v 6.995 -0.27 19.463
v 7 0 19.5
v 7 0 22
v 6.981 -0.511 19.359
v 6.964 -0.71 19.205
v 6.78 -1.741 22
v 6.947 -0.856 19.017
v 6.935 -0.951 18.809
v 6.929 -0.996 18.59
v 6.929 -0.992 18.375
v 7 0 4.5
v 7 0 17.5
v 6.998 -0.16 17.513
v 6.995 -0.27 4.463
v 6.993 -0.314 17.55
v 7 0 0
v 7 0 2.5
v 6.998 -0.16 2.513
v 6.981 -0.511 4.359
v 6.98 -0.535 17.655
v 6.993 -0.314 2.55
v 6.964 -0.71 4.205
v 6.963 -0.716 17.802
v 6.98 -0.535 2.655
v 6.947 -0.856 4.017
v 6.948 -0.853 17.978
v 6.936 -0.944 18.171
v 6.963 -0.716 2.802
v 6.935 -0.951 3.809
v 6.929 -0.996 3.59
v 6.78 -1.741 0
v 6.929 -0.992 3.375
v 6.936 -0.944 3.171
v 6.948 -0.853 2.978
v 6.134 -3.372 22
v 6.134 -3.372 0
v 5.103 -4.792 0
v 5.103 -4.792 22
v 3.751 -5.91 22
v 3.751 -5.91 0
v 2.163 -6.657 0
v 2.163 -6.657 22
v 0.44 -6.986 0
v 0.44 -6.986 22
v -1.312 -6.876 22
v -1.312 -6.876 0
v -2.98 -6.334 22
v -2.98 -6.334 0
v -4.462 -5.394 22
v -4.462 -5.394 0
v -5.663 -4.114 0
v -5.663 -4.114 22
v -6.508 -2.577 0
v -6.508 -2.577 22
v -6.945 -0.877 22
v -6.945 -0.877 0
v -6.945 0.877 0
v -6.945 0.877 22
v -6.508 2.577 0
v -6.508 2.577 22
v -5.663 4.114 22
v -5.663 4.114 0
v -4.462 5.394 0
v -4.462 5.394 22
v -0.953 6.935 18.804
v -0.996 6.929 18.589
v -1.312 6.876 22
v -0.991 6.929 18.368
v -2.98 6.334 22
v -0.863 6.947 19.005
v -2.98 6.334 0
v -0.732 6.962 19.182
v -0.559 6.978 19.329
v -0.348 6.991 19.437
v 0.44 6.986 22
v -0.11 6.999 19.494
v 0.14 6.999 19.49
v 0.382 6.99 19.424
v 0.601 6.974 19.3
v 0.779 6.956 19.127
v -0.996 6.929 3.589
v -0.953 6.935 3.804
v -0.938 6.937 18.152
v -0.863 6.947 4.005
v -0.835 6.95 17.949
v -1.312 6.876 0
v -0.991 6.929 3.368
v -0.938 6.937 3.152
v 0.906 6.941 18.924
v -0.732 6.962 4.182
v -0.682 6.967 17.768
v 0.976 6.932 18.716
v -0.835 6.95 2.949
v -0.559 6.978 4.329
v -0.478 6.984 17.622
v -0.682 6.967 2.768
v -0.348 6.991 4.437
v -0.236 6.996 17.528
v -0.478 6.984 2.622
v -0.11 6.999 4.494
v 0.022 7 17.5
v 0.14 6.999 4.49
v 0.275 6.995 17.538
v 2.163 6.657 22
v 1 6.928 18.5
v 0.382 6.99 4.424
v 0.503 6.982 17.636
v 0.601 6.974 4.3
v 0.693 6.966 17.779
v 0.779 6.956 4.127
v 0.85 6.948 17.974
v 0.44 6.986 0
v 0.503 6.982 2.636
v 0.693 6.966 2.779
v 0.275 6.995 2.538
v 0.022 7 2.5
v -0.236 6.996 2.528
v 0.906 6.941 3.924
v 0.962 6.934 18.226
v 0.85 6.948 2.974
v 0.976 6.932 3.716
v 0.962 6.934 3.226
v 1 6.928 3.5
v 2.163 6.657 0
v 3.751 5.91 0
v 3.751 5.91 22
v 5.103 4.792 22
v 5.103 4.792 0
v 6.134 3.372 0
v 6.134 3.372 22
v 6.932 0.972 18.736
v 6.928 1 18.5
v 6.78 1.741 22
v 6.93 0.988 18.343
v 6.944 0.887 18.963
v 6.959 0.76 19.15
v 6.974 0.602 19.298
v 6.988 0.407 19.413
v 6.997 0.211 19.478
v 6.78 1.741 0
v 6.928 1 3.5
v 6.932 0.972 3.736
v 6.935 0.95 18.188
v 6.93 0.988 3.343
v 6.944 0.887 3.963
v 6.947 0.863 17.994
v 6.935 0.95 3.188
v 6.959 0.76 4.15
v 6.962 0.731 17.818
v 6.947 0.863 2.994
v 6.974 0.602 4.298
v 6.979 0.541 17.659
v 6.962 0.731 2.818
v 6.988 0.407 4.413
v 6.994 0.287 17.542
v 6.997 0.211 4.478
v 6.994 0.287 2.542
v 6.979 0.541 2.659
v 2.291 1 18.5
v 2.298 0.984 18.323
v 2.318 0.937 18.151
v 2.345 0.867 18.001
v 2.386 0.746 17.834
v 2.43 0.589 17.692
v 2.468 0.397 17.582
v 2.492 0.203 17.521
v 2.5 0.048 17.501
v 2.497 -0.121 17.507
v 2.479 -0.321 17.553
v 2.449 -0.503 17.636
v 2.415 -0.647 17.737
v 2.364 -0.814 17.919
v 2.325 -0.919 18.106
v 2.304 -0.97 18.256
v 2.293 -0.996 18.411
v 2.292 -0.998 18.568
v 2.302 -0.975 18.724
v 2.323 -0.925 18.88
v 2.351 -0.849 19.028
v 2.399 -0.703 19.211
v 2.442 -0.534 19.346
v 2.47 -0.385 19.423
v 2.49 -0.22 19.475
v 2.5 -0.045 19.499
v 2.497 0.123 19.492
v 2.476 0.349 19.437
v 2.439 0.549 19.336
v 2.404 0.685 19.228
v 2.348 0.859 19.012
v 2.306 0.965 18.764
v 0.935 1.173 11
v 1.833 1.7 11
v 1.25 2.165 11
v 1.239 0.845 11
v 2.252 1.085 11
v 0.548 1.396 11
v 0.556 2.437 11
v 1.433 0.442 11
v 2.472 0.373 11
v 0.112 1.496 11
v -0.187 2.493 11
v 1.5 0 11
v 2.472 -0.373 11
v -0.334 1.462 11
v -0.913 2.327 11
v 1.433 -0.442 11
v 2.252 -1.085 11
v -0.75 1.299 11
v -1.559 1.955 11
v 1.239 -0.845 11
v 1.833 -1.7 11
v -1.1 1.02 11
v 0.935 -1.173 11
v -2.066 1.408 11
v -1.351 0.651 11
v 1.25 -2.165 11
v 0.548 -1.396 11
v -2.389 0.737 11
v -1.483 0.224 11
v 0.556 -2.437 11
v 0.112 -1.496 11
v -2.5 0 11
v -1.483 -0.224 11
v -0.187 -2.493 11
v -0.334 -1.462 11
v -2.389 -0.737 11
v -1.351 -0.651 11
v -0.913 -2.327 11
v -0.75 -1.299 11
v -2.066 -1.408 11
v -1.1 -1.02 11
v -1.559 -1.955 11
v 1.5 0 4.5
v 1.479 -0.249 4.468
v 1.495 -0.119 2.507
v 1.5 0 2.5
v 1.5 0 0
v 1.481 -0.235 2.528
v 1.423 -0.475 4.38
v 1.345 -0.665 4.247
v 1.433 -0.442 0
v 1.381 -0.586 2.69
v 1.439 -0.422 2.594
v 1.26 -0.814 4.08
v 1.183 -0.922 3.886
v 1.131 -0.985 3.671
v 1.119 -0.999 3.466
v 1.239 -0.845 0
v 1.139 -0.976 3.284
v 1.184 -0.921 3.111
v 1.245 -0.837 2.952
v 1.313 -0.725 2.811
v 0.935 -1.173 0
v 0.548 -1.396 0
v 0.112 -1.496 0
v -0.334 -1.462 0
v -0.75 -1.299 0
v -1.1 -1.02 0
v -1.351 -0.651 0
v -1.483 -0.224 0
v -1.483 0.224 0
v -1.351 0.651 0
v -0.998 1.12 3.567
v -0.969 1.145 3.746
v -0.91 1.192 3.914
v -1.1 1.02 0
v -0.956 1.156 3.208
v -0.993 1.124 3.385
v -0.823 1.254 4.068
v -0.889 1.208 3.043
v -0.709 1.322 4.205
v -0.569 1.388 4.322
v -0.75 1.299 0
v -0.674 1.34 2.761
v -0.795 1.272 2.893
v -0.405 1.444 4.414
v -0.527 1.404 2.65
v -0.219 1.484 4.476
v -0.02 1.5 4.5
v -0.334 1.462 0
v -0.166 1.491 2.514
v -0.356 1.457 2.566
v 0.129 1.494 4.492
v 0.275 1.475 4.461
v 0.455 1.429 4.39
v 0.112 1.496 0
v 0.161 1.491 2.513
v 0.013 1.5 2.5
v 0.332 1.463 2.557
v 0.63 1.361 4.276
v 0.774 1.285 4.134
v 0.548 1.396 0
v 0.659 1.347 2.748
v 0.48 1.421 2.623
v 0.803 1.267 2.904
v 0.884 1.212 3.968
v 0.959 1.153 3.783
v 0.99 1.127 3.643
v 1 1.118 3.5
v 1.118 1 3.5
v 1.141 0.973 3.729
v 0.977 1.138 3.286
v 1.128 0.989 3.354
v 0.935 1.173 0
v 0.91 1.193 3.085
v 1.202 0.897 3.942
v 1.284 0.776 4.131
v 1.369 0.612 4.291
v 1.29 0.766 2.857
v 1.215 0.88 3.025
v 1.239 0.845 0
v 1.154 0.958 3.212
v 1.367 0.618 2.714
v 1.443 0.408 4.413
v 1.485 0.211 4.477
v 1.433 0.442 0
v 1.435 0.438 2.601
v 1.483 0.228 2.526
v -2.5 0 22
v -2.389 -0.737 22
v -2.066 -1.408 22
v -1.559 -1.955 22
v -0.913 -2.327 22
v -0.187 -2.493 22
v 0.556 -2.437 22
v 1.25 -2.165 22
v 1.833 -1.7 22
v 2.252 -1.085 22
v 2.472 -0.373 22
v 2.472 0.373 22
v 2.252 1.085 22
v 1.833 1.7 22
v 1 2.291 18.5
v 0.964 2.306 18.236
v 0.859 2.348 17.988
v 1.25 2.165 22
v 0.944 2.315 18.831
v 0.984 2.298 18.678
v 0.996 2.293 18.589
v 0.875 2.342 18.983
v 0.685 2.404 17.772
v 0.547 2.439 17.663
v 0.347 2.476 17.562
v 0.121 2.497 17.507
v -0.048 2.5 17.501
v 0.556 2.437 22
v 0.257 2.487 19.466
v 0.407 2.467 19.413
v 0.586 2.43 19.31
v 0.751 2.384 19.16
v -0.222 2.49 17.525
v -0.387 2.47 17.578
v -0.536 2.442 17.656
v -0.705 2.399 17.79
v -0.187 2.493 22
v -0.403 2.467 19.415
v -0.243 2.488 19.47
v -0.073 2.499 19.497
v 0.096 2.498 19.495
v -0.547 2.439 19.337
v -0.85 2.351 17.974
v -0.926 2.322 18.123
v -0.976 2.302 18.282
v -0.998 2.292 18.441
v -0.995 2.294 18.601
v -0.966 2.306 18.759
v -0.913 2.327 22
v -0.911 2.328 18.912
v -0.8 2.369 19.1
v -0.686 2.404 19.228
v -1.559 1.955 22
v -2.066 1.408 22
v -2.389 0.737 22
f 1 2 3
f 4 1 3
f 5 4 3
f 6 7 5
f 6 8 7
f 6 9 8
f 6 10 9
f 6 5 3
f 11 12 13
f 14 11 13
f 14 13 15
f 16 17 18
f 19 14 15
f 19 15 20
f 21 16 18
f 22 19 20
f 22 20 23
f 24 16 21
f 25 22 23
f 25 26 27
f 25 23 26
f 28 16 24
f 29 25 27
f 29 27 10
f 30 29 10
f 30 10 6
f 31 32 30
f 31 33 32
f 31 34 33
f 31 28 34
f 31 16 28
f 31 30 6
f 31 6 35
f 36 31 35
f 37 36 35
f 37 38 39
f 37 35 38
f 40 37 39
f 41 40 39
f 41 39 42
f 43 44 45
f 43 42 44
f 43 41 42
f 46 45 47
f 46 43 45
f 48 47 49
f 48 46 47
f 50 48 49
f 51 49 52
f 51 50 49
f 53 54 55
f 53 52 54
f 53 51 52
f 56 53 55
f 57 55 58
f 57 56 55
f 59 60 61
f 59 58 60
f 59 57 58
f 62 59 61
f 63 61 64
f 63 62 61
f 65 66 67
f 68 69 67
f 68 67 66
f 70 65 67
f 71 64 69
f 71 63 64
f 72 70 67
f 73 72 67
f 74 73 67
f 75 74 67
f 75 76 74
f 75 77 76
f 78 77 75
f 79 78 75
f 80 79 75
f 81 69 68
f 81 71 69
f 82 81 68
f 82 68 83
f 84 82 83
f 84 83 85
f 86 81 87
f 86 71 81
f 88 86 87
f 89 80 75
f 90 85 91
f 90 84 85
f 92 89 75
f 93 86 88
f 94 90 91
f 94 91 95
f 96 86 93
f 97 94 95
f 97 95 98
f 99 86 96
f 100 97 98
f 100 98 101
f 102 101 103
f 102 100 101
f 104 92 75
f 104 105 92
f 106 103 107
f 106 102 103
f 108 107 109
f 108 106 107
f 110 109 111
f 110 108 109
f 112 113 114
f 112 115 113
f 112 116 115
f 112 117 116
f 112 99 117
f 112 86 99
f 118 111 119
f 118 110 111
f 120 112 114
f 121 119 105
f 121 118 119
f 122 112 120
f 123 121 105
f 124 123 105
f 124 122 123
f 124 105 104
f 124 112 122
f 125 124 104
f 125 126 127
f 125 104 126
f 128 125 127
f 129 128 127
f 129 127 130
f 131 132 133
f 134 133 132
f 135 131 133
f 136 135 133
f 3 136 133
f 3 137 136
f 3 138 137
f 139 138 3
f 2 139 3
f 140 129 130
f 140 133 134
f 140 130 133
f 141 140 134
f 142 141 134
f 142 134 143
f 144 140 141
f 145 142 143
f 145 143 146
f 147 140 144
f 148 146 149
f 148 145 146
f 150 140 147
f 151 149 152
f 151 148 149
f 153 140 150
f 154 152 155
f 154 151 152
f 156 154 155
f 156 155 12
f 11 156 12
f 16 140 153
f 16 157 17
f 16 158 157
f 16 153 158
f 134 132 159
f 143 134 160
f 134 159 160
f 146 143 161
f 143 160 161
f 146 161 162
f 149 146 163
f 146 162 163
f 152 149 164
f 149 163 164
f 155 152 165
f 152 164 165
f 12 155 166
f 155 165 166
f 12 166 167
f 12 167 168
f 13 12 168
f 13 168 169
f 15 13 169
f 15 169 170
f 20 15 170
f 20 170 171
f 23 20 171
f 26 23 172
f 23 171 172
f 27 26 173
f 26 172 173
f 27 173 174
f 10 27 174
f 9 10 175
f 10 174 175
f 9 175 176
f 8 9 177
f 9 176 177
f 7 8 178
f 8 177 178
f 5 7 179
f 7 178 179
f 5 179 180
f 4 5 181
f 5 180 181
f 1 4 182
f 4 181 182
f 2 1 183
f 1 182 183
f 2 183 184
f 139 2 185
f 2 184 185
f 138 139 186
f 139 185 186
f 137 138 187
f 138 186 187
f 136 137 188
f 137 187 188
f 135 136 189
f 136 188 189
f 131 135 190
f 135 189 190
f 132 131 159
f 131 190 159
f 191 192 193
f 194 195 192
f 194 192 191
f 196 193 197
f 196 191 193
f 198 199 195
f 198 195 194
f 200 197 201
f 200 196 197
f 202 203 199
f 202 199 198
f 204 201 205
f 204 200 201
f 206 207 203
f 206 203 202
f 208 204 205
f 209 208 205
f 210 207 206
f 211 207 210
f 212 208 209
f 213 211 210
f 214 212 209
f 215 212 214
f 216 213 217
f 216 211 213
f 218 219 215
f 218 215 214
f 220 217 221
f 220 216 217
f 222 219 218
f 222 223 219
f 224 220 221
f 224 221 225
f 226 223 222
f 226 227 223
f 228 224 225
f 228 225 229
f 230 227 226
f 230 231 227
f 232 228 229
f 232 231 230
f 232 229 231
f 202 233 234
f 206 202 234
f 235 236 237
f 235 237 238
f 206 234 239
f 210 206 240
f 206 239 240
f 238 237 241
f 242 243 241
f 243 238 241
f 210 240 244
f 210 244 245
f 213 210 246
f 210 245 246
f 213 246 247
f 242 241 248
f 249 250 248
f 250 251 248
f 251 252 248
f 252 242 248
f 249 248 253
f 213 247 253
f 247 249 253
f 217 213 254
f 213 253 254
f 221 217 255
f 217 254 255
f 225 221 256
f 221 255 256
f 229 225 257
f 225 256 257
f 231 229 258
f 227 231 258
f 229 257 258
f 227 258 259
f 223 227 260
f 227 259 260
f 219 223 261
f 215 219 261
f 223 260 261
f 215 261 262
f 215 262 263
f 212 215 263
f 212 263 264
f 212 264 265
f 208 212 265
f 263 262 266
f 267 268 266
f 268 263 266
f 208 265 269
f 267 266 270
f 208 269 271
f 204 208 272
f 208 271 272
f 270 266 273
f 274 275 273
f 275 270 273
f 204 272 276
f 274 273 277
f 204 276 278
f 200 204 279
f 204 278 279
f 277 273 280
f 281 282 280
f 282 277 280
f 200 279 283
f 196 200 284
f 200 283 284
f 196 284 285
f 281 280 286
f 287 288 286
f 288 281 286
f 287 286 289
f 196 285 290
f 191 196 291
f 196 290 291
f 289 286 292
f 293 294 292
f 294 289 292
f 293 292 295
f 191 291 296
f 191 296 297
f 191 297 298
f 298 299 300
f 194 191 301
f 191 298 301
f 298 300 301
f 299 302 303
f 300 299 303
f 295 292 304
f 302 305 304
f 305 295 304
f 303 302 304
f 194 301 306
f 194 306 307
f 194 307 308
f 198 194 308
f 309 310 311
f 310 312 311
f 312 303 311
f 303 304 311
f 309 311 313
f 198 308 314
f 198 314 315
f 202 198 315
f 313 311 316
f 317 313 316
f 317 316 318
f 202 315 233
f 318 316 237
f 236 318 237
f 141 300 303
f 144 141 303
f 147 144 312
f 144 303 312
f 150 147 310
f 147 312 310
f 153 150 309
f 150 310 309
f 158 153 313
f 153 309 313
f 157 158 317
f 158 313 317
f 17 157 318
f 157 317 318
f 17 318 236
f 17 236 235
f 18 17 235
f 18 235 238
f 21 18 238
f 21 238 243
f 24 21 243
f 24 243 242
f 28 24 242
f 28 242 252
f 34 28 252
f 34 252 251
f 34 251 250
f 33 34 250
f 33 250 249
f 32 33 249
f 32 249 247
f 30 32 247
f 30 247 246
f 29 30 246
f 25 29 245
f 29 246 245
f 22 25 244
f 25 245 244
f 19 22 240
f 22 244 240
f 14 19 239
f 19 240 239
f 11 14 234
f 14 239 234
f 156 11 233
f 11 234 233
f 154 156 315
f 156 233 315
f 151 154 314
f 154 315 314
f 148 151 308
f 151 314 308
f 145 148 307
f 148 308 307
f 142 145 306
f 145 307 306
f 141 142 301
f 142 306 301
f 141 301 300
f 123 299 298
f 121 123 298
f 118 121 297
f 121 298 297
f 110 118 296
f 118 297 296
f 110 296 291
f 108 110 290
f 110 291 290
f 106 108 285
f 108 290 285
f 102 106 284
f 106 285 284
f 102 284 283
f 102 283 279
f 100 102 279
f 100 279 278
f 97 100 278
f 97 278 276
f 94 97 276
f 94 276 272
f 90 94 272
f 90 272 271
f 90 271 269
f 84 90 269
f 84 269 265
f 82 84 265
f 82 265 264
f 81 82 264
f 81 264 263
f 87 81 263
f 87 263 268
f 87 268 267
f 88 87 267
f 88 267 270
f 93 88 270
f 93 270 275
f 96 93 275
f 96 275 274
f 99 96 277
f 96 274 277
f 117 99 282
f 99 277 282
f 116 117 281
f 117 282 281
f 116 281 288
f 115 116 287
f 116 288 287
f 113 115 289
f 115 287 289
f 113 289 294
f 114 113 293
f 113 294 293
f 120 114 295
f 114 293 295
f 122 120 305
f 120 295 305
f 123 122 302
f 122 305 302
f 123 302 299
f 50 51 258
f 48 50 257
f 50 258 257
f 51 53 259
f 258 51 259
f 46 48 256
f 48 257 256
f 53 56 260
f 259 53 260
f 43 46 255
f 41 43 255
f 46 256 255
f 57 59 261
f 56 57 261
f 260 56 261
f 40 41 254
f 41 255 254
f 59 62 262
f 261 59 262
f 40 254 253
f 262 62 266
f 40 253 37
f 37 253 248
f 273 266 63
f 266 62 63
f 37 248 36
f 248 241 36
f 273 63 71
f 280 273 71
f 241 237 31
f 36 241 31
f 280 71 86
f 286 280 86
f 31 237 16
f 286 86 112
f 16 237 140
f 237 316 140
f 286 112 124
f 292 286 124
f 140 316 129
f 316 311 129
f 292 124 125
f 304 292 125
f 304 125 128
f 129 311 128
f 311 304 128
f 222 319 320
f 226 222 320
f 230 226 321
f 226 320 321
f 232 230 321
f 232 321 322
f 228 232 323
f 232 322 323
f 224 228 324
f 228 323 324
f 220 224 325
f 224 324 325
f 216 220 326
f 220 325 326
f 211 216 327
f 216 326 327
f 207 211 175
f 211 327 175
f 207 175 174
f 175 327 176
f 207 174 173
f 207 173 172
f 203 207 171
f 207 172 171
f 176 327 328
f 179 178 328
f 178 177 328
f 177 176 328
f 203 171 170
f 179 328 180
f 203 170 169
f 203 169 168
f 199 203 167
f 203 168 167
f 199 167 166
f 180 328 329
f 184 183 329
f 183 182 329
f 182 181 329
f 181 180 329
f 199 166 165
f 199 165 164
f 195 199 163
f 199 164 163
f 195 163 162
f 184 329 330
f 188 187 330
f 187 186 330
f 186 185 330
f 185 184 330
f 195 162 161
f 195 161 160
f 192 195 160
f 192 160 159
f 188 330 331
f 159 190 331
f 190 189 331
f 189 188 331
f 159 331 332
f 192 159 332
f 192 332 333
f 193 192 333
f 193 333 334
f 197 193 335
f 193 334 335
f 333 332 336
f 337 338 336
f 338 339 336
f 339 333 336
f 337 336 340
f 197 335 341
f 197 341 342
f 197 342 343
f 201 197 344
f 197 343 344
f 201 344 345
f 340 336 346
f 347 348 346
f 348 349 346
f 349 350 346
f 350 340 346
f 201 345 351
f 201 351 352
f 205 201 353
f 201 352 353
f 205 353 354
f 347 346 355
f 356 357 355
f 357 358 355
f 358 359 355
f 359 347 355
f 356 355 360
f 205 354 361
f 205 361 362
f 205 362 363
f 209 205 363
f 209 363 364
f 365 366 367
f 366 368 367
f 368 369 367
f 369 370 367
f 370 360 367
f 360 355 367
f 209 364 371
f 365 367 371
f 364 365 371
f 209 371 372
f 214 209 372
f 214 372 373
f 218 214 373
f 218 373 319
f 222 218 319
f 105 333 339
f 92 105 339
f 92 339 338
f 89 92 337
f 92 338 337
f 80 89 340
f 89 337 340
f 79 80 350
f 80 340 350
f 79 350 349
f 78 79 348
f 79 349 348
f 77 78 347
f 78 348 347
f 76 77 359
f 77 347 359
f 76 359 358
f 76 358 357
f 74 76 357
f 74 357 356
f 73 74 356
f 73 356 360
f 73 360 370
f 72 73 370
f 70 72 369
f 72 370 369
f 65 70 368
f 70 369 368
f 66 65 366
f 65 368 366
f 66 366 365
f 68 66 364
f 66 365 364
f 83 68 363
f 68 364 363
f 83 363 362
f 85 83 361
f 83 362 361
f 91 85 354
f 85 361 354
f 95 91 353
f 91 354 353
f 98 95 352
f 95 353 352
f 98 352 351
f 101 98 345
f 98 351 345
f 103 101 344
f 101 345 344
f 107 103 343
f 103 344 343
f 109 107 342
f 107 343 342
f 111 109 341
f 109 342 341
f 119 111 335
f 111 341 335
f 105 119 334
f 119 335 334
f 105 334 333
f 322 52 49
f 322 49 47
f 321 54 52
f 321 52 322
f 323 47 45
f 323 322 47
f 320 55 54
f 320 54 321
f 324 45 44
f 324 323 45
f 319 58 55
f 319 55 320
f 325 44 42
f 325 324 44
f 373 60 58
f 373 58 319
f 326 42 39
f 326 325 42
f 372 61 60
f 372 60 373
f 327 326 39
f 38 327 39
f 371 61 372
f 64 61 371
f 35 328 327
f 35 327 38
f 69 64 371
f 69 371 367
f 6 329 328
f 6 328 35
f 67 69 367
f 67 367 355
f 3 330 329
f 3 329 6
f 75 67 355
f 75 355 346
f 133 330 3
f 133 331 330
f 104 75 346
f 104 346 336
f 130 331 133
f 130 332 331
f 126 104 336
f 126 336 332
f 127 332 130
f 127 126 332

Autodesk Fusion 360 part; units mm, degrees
sketch "スケッチ1" plane through (0, 0, 0) normal (0, 0, 1) x (1, 0, 0)
  circle A0 centre (0, 0) radius 7
  dimension "d1" = 14
extrude "押し出し1" add sketch "スケッチ1" along normal blind 12
extrude "押し出し2" add 1 faces at (1.11, -1.8763, 12) along direction (0, 0, 1) blind 10
sketch "スケッチ2" plane through (0, 0, 22) normal (0, 0, 1) x (-1, 0, 0)
  circle A0 centre (0, 0) radius 7
  circle A1 centre (0, 0) radius 2.5
  dimension "d6" = 5
sketch "スケッチ3" plane through (0, 0, 0) normal (0, 0, -1) x (1, 0, 0)
  circle A0 centre (0, 0) radius 7
  circle A1 centre (0, 0) radius 1.5
  dimension "d7" = 3
extrude "押し出し3" cut sketch "スケッチ3" against normal blind 11 contours A1
extrude "押し出し4" cut sketch "スケッチ2" against normal blind 11 contours A1
sketch "スケッチ4" plane through (0, 0, 0) normal (0, 1, 0) x (1, 0, 0)
  line L0 (-7, -22) -> (7, -22)
  line L1 (7, -22) -> (7, 0)
  line L2 (7, 0) -> (-7, 0)
  line L3 (-7, 0) -> (-7, -22)
  line L4 (-7, -22) -> (-7, -18.5)
  line L5 (-7, -18.5) -> (7, -18.5)
  line L6 (7, -22) -> (7, -18.5)
  line L7 (0, -22) -> (0, 0)
  circle A0 centre (0, -18.5) radius 1
  line L8 (-7, 0) -> (-7, -3.5)
  line L9 (-7, -3.5) -> (7, -3.5)
  circle A1 centre (0, -3.5) radius 1
  dimension "d12" = 3.5
  dimension "d13" = 2
  dimension "d20" = 3.5
  dimension "d21" = 2
extrude "押し出し5" cut sketch "スケッチ4" along normal blind 10 contours L5 L7 A0 | L5 L7 A0 | L5 L7 A0 | L5 L7 A0
sketch "スケッチ5" plane through (0, 0, 0) normal (1, 0, 0) x (0, 1, 0)
  line L0 (-7, 22) -> (7, 22)
  line L1 (7, 22) -> (7, 0)
  line L2 (7, 0) -> (-7, 0)
  line L3 (-7, 0) -> (-7, 22)
  line L4 (-7, 22) -> (-7, 18.5)
  line L5 (-7, 22) -> (7, 22)
  line L6 (7, 22) -> (7, 18.5)
  line L7 (7, 18.5) -> (-7, 18.5)
  line L8 (-7, 18.5) -> (-7, 22)
  circle A0 centre (0, 18.5) radius 1
  line L9 (7, 0) -> (7, 3.5)
  line L10 (7, 3.5) -> (-7, 3.5)
  circle A1 centre (0, 3.5) radius 1
  dimension "d16" = 3.5
  dimension "d17" = 2
  dimension "d24" = 3.5
  dimension "d25" = 2
extrude "押し出し6" cut sketch "スケッチ5" along normal blind 10 contours L7 A0 | L7 A0
extrude "押し出し7" cut sketch "スケッチ4" along normal blind 10 contours L7 L9 A1 | L7 L9 A1 | L7 L9 A1 | L7 L9 A1
extrude "押し出し8" cut sketch "スケッチ5" along normal blind 10 contours L10 A1 | L10 A1
